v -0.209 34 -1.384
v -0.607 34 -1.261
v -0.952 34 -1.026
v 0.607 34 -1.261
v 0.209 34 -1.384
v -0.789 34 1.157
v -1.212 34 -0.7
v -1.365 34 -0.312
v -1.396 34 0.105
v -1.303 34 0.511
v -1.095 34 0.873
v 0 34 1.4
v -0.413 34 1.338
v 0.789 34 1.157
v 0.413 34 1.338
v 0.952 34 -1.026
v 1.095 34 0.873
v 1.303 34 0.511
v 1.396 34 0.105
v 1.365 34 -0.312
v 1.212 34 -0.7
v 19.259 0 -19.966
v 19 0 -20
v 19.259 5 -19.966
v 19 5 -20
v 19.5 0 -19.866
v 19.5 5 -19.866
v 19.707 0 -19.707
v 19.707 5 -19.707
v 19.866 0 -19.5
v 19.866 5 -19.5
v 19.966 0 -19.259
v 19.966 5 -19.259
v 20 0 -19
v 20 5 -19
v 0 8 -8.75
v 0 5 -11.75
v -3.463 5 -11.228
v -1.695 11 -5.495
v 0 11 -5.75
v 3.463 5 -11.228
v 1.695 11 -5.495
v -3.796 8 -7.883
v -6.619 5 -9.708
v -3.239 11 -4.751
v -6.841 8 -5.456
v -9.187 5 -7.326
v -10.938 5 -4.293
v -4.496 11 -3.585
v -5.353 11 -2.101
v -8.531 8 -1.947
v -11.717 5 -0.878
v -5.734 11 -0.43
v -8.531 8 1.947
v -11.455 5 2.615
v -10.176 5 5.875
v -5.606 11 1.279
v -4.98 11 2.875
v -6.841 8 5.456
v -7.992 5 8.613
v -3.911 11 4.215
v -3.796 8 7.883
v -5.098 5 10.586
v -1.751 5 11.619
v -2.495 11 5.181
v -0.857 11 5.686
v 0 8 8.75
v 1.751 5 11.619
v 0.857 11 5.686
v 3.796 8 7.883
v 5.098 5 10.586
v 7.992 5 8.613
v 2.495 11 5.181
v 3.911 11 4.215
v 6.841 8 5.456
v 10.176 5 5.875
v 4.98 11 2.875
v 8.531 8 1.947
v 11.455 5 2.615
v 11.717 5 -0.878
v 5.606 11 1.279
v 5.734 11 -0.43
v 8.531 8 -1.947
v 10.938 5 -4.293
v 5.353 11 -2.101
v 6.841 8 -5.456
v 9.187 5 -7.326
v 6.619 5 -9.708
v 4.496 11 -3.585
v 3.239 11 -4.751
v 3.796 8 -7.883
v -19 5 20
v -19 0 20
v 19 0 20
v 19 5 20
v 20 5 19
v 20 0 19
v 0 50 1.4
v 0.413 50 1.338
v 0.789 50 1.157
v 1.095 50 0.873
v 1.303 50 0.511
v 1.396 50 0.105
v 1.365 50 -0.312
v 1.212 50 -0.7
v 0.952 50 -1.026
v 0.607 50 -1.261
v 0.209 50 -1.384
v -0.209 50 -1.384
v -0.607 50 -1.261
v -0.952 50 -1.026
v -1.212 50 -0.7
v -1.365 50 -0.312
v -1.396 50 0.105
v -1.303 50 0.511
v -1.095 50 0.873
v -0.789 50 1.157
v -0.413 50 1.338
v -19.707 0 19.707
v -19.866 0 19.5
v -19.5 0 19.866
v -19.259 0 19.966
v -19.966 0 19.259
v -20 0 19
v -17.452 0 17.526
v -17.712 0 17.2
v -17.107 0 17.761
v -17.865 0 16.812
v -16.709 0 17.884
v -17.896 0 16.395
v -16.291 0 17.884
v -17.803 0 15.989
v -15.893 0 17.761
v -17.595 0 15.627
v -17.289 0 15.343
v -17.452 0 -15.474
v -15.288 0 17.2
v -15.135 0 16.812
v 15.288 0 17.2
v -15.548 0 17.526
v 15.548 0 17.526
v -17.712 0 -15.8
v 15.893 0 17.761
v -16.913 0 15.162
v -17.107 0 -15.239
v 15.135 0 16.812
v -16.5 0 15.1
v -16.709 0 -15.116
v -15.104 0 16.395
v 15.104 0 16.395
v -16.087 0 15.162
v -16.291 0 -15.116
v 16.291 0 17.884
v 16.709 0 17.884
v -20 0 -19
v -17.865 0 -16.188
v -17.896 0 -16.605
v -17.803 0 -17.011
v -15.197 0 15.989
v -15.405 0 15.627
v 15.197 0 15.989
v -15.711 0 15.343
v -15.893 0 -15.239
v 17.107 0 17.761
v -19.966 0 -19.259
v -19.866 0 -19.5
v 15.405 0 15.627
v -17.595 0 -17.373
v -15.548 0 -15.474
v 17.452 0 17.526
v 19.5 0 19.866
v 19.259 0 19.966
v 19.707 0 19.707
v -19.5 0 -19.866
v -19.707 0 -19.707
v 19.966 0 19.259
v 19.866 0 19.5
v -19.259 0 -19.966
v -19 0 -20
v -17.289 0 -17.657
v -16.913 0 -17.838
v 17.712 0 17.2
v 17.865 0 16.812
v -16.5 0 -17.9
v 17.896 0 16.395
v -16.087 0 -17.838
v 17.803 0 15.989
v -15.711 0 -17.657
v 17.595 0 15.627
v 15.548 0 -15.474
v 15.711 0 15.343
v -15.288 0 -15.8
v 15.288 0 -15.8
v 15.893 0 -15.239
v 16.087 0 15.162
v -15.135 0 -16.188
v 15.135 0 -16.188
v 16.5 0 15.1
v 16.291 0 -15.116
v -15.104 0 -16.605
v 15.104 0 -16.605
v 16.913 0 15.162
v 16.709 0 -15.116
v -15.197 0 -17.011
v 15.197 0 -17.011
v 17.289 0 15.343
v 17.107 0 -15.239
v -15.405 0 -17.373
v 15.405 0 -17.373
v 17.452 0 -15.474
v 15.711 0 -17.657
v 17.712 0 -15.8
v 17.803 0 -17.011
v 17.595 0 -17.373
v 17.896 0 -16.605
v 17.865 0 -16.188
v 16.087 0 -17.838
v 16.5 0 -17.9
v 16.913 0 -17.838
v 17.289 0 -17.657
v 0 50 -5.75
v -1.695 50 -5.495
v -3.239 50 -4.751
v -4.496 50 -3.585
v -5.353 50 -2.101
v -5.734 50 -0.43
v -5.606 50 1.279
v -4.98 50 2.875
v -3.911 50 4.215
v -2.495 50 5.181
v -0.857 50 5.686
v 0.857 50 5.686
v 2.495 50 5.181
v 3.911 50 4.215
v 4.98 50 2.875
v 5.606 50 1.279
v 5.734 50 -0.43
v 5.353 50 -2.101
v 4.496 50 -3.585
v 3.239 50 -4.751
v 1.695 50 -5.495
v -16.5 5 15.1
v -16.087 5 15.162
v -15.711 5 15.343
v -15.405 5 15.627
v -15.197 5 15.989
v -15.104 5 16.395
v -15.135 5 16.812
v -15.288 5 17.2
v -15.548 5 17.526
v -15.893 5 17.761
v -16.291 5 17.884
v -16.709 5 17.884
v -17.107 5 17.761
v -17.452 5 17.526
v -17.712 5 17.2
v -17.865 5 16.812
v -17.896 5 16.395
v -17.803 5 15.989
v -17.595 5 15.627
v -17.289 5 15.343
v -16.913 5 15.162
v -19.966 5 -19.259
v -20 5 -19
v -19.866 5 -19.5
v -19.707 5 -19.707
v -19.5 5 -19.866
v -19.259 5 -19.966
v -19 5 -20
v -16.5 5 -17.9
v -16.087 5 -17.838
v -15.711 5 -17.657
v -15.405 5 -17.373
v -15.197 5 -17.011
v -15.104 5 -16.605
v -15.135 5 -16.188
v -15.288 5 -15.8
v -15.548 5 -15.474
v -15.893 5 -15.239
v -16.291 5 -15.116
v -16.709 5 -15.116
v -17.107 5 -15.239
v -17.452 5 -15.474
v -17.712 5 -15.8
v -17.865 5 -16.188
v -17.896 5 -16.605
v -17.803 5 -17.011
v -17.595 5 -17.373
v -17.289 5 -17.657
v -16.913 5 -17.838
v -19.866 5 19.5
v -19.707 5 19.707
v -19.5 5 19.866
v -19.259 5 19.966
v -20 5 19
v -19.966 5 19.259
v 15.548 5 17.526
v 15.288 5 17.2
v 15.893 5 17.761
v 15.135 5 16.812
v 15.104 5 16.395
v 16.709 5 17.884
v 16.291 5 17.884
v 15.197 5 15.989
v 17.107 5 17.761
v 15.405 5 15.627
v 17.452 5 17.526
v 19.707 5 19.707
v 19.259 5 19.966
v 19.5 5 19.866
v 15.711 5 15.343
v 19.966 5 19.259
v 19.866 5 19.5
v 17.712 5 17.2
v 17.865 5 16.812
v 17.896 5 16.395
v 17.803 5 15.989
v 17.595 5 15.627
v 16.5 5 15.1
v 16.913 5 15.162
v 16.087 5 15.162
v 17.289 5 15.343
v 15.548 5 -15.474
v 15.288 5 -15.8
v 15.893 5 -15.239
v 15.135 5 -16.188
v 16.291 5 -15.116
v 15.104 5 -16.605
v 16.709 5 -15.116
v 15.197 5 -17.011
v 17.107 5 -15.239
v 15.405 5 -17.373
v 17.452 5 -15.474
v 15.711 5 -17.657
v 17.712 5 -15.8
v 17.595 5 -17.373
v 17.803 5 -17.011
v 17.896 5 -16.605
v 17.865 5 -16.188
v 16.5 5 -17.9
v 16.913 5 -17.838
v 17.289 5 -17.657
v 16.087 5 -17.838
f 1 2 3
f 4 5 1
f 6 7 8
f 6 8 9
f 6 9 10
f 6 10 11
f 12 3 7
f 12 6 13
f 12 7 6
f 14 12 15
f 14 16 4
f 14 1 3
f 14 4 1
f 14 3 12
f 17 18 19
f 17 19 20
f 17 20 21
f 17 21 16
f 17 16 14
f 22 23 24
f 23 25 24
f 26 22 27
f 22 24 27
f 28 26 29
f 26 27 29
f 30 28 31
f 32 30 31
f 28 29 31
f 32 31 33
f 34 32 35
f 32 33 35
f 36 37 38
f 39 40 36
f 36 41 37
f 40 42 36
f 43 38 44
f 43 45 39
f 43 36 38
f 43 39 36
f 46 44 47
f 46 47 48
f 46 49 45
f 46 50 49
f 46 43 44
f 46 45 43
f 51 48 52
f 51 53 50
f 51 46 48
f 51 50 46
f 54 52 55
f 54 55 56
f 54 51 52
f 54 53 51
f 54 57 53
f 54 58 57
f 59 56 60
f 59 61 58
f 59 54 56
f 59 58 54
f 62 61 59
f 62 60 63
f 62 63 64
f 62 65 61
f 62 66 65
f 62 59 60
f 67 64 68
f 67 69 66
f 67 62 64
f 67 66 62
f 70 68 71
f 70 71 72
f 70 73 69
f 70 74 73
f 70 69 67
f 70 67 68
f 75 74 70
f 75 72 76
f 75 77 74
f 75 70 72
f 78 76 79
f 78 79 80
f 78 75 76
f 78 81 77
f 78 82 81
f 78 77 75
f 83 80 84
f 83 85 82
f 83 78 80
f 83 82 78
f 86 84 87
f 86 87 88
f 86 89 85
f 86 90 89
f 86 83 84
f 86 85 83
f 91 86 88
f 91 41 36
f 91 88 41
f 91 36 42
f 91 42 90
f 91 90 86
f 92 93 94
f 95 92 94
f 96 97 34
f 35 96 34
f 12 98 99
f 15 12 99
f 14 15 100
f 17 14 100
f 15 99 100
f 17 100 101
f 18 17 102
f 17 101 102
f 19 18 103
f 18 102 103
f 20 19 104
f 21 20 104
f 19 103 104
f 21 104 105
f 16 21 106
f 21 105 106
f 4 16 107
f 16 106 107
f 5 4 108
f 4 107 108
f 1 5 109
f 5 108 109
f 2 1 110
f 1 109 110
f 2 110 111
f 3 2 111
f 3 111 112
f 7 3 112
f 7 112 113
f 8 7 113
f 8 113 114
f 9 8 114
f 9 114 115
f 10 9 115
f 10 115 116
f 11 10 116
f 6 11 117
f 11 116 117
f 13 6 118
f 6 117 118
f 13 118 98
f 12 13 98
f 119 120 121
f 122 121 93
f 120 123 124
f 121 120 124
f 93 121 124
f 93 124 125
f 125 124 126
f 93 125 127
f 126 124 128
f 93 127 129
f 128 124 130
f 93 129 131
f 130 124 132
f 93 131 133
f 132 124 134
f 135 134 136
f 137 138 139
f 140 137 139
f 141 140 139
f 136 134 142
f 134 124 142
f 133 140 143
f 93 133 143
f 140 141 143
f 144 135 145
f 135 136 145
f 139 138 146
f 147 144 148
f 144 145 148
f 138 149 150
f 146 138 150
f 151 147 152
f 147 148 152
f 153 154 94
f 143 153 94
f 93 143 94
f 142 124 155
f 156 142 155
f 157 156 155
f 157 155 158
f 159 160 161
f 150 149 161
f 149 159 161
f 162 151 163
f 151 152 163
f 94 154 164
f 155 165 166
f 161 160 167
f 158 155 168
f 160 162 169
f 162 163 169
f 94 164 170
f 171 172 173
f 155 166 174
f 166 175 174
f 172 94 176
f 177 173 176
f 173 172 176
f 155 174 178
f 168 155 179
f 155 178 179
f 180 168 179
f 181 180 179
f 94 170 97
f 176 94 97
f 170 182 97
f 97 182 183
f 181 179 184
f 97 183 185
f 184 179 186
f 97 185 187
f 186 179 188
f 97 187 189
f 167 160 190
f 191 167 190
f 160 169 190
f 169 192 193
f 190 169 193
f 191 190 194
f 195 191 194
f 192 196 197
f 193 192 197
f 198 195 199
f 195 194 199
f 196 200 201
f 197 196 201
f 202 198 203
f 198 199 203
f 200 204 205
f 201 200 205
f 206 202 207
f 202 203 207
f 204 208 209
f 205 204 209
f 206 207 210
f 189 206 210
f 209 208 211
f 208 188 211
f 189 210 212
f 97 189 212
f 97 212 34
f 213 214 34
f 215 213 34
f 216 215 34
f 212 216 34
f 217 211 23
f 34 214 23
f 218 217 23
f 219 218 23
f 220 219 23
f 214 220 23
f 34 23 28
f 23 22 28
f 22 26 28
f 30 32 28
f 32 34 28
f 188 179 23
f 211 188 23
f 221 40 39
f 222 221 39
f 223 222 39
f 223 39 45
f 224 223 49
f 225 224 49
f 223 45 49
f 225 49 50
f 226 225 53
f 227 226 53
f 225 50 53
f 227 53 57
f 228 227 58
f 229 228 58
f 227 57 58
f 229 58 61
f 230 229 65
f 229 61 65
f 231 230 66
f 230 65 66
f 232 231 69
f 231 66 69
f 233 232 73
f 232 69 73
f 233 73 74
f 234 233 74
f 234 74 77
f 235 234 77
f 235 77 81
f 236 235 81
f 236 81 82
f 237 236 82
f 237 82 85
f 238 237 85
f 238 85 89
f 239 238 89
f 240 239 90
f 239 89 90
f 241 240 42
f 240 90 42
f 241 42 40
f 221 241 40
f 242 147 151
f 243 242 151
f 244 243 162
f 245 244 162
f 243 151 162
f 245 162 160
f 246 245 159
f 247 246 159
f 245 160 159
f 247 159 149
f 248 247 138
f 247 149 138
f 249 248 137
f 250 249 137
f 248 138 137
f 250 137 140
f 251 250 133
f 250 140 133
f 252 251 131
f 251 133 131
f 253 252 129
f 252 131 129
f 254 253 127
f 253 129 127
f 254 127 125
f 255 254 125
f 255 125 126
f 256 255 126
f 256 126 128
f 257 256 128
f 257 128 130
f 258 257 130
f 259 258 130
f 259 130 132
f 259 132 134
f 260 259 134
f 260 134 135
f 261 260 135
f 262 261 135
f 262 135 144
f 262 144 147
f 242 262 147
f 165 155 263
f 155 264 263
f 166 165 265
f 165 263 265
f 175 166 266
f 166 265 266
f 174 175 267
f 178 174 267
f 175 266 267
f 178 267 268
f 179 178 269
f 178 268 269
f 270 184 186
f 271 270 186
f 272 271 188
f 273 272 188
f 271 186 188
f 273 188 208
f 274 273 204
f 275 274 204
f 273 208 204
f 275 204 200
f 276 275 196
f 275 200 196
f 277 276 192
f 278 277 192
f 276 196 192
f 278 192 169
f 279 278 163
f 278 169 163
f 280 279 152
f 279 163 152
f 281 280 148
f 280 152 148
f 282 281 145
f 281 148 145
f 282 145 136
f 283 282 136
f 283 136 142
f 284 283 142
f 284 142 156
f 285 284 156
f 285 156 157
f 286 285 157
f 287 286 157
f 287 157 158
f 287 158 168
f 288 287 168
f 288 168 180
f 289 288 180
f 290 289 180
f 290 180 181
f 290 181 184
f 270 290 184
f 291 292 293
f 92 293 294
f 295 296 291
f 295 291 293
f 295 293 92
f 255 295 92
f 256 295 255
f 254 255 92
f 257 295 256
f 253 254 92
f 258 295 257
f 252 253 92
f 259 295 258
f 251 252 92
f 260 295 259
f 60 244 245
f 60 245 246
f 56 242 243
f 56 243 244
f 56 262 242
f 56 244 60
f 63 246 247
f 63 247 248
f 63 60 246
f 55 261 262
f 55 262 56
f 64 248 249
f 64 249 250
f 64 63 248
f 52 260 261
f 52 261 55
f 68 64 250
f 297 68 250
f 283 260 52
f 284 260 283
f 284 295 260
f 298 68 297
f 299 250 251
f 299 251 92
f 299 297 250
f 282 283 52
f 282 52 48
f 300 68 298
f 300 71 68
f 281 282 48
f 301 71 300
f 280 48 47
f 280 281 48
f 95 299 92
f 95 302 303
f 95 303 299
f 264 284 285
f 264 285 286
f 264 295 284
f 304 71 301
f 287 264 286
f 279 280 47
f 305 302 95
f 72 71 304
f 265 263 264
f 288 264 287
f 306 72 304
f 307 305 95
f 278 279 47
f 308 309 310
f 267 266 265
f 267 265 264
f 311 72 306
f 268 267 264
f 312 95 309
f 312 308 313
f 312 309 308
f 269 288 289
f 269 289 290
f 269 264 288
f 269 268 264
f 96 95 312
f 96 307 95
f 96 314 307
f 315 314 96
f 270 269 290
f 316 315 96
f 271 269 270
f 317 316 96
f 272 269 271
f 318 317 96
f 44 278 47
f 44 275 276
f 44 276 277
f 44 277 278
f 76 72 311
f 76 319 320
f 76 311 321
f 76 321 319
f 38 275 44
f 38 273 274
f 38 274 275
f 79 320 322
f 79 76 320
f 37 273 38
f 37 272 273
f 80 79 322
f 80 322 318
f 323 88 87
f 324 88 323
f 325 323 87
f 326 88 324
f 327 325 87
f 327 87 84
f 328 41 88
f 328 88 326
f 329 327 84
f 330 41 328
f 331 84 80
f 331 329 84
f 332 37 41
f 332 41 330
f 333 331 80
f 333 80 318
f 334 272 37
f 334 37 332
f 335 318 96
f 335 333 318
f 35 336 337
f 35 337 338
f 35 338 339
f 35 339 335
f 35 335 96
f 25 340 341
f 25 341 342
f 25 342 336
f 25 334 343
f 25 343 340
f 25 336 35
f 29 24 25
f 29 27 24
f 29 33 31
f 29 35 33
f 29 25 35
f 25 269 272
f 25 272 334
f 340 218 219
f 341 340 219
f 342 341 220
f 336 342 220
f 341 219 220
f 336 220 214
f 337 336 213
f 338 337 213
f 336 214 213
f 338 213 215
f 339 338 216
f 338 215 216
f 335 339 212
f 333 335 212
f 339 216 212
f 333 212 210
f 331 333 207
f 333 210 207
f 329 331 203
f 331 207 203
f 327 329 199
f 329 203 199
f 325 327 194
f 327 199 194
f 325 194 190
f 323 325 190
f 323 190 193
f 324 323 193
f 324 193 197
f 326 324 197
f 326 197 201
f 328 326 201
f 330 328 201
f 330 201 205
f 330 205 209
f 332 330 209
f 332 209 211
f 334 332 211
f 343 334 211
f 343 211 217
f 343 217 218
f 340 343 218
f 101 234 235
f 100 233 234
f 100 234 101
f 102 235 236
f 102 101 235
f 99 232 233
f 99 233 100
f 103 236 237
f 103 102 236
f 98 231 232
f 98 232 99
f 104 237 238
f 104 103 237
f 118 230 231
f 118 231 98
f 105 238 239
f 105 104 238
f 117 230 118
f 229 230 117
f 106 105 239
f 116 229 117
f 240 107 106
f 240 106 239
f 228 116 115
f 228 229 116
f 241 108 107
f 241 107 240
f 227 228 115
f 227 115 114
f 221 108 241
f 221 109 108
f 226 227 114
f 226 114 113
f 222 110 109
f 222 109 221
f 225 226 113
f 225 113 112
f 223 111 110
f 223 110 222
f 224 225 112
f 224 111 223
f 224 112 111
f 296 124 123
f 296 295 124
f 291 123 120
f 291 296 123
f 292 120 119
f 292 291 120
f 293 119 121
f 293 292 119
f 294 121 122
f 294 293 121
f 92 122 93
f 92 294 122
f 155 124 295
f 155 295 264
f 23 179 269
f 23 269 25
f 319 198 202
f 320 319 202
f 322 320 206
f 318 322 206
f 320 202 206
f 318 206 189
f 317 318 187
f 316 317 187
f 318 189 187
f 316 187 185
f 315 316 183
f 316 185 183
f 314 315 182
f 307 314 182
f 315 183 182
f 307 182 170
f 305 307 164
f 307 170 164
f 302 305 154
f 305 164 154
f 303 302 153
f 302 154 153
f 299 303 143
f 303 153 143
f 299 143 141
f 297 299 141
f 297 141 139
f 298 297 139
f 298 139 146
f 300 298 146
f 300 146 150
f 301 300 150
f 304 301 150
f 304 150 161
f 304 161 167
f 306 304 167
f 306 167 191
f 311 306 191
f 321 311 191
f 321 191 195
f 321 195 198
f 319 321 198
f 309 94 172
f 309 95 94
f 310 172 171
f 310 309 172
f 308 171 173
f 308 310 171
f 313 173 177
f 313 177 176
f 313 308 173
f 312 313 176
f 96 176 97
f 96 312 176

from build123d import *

# Parameters (mm, degrees)
SKETCH1_W           = 40
SKETCH1_H           = 40
BOSS_EXTRUDE1_DEPTH = 5
SKETCH3_R           = 1.4
CUT_EXTRUDE1_DEPTH  = 10
SKETCH4_R           = 5.75
BOSS_EXTRUDE2_DEPTH = 45
CHAMFER1_SIZE       = 6
SKETCH6_R           = 1.4
CUT_EXTRUDE2_DEPTH  = 16
FILLET1_R           = 1


with BuildPart() as part:
    # Sketch1 → Boss-Extrude1 (new body)
    with BuildSketch(Plane(origin=(0, 0, 0), x_dir=(1, 0, 0), z_dir=(0, 1, 0))):
        Rectangle(SKETCH1_W, SKETCH1_H)
    extrude(amount=BOSS_EXTRUDE1_DEPTH)

    # Sketch3 → Cut-Extrude1 (cut)
    with BuildSketch(Plane.XZ):
        with Locations(Location((-16.5, -16.5, 0), (0, 0, 270))):
            Circle(SKETCH3_R)
        with Locations(Location((-16.5, 16.5, 0), (0, 0, 270))):
            Circle(SKETCH3_R)
        with Locations(Location((16.5, 16.5, 0), (0, 0, 270))):
            Circle(SKETCH3_R)
        with Locations(Location((16.5, -16.5, 0), (0, 0, 270))):
            Circle(SKETCH3_R)
    extrude(amount=-CUT_EXTRUDE1_DEPTH, mode=Mode.SUBTRACT)

    # Sketch4 → Boss-Extrude2 (add)
    with BuildSketch(Plane(origin=(0, 5, 0), x_dir=(1, 0, 0), z_dir=(0, 1, 0))):
        with Locations(Location((0, 0, 0), (0, 0, 90))):
            Circle(SKETCH4_R)
    extrude(amount=BOSS_EXTRUDE2_DEPTH)

    # Chamfer1
    chamfer1_edges = [part.edges().sort_by_distance(p)[0] for p in [
        (0, 5, 5.75),
    ]]
    chamfer(chamfer1_edges, length=CHAMFER1_SIZE)

    # Sketch6 → Cut-Extrude2 (cut)
    with BuildSketch(Plane(origin=(0, 50, 0), x_dir=(1, 0, 0), z_dir=(0, 1, 0))):
        with Locations(Location((0, 0, 0), (0, 0, 270))):
            Circle(SKETCH6_R)
    extrude(amount=-CUT_EXTRUDE2_DEPTH, mode=Mode.SUBTRACT)

    # Fillet1
    fillet1_edges = [part.edges().sort_by_distance(p)[0] for p in [
        (20, 2.5, 20),
        (-20, 2.5, 20),
        (-20, 2.5, -20),
        (20, 2.5, -20),
    ]]
    fillet(fillet1_edges, radius=FILLET1_R)


solid = part.part
